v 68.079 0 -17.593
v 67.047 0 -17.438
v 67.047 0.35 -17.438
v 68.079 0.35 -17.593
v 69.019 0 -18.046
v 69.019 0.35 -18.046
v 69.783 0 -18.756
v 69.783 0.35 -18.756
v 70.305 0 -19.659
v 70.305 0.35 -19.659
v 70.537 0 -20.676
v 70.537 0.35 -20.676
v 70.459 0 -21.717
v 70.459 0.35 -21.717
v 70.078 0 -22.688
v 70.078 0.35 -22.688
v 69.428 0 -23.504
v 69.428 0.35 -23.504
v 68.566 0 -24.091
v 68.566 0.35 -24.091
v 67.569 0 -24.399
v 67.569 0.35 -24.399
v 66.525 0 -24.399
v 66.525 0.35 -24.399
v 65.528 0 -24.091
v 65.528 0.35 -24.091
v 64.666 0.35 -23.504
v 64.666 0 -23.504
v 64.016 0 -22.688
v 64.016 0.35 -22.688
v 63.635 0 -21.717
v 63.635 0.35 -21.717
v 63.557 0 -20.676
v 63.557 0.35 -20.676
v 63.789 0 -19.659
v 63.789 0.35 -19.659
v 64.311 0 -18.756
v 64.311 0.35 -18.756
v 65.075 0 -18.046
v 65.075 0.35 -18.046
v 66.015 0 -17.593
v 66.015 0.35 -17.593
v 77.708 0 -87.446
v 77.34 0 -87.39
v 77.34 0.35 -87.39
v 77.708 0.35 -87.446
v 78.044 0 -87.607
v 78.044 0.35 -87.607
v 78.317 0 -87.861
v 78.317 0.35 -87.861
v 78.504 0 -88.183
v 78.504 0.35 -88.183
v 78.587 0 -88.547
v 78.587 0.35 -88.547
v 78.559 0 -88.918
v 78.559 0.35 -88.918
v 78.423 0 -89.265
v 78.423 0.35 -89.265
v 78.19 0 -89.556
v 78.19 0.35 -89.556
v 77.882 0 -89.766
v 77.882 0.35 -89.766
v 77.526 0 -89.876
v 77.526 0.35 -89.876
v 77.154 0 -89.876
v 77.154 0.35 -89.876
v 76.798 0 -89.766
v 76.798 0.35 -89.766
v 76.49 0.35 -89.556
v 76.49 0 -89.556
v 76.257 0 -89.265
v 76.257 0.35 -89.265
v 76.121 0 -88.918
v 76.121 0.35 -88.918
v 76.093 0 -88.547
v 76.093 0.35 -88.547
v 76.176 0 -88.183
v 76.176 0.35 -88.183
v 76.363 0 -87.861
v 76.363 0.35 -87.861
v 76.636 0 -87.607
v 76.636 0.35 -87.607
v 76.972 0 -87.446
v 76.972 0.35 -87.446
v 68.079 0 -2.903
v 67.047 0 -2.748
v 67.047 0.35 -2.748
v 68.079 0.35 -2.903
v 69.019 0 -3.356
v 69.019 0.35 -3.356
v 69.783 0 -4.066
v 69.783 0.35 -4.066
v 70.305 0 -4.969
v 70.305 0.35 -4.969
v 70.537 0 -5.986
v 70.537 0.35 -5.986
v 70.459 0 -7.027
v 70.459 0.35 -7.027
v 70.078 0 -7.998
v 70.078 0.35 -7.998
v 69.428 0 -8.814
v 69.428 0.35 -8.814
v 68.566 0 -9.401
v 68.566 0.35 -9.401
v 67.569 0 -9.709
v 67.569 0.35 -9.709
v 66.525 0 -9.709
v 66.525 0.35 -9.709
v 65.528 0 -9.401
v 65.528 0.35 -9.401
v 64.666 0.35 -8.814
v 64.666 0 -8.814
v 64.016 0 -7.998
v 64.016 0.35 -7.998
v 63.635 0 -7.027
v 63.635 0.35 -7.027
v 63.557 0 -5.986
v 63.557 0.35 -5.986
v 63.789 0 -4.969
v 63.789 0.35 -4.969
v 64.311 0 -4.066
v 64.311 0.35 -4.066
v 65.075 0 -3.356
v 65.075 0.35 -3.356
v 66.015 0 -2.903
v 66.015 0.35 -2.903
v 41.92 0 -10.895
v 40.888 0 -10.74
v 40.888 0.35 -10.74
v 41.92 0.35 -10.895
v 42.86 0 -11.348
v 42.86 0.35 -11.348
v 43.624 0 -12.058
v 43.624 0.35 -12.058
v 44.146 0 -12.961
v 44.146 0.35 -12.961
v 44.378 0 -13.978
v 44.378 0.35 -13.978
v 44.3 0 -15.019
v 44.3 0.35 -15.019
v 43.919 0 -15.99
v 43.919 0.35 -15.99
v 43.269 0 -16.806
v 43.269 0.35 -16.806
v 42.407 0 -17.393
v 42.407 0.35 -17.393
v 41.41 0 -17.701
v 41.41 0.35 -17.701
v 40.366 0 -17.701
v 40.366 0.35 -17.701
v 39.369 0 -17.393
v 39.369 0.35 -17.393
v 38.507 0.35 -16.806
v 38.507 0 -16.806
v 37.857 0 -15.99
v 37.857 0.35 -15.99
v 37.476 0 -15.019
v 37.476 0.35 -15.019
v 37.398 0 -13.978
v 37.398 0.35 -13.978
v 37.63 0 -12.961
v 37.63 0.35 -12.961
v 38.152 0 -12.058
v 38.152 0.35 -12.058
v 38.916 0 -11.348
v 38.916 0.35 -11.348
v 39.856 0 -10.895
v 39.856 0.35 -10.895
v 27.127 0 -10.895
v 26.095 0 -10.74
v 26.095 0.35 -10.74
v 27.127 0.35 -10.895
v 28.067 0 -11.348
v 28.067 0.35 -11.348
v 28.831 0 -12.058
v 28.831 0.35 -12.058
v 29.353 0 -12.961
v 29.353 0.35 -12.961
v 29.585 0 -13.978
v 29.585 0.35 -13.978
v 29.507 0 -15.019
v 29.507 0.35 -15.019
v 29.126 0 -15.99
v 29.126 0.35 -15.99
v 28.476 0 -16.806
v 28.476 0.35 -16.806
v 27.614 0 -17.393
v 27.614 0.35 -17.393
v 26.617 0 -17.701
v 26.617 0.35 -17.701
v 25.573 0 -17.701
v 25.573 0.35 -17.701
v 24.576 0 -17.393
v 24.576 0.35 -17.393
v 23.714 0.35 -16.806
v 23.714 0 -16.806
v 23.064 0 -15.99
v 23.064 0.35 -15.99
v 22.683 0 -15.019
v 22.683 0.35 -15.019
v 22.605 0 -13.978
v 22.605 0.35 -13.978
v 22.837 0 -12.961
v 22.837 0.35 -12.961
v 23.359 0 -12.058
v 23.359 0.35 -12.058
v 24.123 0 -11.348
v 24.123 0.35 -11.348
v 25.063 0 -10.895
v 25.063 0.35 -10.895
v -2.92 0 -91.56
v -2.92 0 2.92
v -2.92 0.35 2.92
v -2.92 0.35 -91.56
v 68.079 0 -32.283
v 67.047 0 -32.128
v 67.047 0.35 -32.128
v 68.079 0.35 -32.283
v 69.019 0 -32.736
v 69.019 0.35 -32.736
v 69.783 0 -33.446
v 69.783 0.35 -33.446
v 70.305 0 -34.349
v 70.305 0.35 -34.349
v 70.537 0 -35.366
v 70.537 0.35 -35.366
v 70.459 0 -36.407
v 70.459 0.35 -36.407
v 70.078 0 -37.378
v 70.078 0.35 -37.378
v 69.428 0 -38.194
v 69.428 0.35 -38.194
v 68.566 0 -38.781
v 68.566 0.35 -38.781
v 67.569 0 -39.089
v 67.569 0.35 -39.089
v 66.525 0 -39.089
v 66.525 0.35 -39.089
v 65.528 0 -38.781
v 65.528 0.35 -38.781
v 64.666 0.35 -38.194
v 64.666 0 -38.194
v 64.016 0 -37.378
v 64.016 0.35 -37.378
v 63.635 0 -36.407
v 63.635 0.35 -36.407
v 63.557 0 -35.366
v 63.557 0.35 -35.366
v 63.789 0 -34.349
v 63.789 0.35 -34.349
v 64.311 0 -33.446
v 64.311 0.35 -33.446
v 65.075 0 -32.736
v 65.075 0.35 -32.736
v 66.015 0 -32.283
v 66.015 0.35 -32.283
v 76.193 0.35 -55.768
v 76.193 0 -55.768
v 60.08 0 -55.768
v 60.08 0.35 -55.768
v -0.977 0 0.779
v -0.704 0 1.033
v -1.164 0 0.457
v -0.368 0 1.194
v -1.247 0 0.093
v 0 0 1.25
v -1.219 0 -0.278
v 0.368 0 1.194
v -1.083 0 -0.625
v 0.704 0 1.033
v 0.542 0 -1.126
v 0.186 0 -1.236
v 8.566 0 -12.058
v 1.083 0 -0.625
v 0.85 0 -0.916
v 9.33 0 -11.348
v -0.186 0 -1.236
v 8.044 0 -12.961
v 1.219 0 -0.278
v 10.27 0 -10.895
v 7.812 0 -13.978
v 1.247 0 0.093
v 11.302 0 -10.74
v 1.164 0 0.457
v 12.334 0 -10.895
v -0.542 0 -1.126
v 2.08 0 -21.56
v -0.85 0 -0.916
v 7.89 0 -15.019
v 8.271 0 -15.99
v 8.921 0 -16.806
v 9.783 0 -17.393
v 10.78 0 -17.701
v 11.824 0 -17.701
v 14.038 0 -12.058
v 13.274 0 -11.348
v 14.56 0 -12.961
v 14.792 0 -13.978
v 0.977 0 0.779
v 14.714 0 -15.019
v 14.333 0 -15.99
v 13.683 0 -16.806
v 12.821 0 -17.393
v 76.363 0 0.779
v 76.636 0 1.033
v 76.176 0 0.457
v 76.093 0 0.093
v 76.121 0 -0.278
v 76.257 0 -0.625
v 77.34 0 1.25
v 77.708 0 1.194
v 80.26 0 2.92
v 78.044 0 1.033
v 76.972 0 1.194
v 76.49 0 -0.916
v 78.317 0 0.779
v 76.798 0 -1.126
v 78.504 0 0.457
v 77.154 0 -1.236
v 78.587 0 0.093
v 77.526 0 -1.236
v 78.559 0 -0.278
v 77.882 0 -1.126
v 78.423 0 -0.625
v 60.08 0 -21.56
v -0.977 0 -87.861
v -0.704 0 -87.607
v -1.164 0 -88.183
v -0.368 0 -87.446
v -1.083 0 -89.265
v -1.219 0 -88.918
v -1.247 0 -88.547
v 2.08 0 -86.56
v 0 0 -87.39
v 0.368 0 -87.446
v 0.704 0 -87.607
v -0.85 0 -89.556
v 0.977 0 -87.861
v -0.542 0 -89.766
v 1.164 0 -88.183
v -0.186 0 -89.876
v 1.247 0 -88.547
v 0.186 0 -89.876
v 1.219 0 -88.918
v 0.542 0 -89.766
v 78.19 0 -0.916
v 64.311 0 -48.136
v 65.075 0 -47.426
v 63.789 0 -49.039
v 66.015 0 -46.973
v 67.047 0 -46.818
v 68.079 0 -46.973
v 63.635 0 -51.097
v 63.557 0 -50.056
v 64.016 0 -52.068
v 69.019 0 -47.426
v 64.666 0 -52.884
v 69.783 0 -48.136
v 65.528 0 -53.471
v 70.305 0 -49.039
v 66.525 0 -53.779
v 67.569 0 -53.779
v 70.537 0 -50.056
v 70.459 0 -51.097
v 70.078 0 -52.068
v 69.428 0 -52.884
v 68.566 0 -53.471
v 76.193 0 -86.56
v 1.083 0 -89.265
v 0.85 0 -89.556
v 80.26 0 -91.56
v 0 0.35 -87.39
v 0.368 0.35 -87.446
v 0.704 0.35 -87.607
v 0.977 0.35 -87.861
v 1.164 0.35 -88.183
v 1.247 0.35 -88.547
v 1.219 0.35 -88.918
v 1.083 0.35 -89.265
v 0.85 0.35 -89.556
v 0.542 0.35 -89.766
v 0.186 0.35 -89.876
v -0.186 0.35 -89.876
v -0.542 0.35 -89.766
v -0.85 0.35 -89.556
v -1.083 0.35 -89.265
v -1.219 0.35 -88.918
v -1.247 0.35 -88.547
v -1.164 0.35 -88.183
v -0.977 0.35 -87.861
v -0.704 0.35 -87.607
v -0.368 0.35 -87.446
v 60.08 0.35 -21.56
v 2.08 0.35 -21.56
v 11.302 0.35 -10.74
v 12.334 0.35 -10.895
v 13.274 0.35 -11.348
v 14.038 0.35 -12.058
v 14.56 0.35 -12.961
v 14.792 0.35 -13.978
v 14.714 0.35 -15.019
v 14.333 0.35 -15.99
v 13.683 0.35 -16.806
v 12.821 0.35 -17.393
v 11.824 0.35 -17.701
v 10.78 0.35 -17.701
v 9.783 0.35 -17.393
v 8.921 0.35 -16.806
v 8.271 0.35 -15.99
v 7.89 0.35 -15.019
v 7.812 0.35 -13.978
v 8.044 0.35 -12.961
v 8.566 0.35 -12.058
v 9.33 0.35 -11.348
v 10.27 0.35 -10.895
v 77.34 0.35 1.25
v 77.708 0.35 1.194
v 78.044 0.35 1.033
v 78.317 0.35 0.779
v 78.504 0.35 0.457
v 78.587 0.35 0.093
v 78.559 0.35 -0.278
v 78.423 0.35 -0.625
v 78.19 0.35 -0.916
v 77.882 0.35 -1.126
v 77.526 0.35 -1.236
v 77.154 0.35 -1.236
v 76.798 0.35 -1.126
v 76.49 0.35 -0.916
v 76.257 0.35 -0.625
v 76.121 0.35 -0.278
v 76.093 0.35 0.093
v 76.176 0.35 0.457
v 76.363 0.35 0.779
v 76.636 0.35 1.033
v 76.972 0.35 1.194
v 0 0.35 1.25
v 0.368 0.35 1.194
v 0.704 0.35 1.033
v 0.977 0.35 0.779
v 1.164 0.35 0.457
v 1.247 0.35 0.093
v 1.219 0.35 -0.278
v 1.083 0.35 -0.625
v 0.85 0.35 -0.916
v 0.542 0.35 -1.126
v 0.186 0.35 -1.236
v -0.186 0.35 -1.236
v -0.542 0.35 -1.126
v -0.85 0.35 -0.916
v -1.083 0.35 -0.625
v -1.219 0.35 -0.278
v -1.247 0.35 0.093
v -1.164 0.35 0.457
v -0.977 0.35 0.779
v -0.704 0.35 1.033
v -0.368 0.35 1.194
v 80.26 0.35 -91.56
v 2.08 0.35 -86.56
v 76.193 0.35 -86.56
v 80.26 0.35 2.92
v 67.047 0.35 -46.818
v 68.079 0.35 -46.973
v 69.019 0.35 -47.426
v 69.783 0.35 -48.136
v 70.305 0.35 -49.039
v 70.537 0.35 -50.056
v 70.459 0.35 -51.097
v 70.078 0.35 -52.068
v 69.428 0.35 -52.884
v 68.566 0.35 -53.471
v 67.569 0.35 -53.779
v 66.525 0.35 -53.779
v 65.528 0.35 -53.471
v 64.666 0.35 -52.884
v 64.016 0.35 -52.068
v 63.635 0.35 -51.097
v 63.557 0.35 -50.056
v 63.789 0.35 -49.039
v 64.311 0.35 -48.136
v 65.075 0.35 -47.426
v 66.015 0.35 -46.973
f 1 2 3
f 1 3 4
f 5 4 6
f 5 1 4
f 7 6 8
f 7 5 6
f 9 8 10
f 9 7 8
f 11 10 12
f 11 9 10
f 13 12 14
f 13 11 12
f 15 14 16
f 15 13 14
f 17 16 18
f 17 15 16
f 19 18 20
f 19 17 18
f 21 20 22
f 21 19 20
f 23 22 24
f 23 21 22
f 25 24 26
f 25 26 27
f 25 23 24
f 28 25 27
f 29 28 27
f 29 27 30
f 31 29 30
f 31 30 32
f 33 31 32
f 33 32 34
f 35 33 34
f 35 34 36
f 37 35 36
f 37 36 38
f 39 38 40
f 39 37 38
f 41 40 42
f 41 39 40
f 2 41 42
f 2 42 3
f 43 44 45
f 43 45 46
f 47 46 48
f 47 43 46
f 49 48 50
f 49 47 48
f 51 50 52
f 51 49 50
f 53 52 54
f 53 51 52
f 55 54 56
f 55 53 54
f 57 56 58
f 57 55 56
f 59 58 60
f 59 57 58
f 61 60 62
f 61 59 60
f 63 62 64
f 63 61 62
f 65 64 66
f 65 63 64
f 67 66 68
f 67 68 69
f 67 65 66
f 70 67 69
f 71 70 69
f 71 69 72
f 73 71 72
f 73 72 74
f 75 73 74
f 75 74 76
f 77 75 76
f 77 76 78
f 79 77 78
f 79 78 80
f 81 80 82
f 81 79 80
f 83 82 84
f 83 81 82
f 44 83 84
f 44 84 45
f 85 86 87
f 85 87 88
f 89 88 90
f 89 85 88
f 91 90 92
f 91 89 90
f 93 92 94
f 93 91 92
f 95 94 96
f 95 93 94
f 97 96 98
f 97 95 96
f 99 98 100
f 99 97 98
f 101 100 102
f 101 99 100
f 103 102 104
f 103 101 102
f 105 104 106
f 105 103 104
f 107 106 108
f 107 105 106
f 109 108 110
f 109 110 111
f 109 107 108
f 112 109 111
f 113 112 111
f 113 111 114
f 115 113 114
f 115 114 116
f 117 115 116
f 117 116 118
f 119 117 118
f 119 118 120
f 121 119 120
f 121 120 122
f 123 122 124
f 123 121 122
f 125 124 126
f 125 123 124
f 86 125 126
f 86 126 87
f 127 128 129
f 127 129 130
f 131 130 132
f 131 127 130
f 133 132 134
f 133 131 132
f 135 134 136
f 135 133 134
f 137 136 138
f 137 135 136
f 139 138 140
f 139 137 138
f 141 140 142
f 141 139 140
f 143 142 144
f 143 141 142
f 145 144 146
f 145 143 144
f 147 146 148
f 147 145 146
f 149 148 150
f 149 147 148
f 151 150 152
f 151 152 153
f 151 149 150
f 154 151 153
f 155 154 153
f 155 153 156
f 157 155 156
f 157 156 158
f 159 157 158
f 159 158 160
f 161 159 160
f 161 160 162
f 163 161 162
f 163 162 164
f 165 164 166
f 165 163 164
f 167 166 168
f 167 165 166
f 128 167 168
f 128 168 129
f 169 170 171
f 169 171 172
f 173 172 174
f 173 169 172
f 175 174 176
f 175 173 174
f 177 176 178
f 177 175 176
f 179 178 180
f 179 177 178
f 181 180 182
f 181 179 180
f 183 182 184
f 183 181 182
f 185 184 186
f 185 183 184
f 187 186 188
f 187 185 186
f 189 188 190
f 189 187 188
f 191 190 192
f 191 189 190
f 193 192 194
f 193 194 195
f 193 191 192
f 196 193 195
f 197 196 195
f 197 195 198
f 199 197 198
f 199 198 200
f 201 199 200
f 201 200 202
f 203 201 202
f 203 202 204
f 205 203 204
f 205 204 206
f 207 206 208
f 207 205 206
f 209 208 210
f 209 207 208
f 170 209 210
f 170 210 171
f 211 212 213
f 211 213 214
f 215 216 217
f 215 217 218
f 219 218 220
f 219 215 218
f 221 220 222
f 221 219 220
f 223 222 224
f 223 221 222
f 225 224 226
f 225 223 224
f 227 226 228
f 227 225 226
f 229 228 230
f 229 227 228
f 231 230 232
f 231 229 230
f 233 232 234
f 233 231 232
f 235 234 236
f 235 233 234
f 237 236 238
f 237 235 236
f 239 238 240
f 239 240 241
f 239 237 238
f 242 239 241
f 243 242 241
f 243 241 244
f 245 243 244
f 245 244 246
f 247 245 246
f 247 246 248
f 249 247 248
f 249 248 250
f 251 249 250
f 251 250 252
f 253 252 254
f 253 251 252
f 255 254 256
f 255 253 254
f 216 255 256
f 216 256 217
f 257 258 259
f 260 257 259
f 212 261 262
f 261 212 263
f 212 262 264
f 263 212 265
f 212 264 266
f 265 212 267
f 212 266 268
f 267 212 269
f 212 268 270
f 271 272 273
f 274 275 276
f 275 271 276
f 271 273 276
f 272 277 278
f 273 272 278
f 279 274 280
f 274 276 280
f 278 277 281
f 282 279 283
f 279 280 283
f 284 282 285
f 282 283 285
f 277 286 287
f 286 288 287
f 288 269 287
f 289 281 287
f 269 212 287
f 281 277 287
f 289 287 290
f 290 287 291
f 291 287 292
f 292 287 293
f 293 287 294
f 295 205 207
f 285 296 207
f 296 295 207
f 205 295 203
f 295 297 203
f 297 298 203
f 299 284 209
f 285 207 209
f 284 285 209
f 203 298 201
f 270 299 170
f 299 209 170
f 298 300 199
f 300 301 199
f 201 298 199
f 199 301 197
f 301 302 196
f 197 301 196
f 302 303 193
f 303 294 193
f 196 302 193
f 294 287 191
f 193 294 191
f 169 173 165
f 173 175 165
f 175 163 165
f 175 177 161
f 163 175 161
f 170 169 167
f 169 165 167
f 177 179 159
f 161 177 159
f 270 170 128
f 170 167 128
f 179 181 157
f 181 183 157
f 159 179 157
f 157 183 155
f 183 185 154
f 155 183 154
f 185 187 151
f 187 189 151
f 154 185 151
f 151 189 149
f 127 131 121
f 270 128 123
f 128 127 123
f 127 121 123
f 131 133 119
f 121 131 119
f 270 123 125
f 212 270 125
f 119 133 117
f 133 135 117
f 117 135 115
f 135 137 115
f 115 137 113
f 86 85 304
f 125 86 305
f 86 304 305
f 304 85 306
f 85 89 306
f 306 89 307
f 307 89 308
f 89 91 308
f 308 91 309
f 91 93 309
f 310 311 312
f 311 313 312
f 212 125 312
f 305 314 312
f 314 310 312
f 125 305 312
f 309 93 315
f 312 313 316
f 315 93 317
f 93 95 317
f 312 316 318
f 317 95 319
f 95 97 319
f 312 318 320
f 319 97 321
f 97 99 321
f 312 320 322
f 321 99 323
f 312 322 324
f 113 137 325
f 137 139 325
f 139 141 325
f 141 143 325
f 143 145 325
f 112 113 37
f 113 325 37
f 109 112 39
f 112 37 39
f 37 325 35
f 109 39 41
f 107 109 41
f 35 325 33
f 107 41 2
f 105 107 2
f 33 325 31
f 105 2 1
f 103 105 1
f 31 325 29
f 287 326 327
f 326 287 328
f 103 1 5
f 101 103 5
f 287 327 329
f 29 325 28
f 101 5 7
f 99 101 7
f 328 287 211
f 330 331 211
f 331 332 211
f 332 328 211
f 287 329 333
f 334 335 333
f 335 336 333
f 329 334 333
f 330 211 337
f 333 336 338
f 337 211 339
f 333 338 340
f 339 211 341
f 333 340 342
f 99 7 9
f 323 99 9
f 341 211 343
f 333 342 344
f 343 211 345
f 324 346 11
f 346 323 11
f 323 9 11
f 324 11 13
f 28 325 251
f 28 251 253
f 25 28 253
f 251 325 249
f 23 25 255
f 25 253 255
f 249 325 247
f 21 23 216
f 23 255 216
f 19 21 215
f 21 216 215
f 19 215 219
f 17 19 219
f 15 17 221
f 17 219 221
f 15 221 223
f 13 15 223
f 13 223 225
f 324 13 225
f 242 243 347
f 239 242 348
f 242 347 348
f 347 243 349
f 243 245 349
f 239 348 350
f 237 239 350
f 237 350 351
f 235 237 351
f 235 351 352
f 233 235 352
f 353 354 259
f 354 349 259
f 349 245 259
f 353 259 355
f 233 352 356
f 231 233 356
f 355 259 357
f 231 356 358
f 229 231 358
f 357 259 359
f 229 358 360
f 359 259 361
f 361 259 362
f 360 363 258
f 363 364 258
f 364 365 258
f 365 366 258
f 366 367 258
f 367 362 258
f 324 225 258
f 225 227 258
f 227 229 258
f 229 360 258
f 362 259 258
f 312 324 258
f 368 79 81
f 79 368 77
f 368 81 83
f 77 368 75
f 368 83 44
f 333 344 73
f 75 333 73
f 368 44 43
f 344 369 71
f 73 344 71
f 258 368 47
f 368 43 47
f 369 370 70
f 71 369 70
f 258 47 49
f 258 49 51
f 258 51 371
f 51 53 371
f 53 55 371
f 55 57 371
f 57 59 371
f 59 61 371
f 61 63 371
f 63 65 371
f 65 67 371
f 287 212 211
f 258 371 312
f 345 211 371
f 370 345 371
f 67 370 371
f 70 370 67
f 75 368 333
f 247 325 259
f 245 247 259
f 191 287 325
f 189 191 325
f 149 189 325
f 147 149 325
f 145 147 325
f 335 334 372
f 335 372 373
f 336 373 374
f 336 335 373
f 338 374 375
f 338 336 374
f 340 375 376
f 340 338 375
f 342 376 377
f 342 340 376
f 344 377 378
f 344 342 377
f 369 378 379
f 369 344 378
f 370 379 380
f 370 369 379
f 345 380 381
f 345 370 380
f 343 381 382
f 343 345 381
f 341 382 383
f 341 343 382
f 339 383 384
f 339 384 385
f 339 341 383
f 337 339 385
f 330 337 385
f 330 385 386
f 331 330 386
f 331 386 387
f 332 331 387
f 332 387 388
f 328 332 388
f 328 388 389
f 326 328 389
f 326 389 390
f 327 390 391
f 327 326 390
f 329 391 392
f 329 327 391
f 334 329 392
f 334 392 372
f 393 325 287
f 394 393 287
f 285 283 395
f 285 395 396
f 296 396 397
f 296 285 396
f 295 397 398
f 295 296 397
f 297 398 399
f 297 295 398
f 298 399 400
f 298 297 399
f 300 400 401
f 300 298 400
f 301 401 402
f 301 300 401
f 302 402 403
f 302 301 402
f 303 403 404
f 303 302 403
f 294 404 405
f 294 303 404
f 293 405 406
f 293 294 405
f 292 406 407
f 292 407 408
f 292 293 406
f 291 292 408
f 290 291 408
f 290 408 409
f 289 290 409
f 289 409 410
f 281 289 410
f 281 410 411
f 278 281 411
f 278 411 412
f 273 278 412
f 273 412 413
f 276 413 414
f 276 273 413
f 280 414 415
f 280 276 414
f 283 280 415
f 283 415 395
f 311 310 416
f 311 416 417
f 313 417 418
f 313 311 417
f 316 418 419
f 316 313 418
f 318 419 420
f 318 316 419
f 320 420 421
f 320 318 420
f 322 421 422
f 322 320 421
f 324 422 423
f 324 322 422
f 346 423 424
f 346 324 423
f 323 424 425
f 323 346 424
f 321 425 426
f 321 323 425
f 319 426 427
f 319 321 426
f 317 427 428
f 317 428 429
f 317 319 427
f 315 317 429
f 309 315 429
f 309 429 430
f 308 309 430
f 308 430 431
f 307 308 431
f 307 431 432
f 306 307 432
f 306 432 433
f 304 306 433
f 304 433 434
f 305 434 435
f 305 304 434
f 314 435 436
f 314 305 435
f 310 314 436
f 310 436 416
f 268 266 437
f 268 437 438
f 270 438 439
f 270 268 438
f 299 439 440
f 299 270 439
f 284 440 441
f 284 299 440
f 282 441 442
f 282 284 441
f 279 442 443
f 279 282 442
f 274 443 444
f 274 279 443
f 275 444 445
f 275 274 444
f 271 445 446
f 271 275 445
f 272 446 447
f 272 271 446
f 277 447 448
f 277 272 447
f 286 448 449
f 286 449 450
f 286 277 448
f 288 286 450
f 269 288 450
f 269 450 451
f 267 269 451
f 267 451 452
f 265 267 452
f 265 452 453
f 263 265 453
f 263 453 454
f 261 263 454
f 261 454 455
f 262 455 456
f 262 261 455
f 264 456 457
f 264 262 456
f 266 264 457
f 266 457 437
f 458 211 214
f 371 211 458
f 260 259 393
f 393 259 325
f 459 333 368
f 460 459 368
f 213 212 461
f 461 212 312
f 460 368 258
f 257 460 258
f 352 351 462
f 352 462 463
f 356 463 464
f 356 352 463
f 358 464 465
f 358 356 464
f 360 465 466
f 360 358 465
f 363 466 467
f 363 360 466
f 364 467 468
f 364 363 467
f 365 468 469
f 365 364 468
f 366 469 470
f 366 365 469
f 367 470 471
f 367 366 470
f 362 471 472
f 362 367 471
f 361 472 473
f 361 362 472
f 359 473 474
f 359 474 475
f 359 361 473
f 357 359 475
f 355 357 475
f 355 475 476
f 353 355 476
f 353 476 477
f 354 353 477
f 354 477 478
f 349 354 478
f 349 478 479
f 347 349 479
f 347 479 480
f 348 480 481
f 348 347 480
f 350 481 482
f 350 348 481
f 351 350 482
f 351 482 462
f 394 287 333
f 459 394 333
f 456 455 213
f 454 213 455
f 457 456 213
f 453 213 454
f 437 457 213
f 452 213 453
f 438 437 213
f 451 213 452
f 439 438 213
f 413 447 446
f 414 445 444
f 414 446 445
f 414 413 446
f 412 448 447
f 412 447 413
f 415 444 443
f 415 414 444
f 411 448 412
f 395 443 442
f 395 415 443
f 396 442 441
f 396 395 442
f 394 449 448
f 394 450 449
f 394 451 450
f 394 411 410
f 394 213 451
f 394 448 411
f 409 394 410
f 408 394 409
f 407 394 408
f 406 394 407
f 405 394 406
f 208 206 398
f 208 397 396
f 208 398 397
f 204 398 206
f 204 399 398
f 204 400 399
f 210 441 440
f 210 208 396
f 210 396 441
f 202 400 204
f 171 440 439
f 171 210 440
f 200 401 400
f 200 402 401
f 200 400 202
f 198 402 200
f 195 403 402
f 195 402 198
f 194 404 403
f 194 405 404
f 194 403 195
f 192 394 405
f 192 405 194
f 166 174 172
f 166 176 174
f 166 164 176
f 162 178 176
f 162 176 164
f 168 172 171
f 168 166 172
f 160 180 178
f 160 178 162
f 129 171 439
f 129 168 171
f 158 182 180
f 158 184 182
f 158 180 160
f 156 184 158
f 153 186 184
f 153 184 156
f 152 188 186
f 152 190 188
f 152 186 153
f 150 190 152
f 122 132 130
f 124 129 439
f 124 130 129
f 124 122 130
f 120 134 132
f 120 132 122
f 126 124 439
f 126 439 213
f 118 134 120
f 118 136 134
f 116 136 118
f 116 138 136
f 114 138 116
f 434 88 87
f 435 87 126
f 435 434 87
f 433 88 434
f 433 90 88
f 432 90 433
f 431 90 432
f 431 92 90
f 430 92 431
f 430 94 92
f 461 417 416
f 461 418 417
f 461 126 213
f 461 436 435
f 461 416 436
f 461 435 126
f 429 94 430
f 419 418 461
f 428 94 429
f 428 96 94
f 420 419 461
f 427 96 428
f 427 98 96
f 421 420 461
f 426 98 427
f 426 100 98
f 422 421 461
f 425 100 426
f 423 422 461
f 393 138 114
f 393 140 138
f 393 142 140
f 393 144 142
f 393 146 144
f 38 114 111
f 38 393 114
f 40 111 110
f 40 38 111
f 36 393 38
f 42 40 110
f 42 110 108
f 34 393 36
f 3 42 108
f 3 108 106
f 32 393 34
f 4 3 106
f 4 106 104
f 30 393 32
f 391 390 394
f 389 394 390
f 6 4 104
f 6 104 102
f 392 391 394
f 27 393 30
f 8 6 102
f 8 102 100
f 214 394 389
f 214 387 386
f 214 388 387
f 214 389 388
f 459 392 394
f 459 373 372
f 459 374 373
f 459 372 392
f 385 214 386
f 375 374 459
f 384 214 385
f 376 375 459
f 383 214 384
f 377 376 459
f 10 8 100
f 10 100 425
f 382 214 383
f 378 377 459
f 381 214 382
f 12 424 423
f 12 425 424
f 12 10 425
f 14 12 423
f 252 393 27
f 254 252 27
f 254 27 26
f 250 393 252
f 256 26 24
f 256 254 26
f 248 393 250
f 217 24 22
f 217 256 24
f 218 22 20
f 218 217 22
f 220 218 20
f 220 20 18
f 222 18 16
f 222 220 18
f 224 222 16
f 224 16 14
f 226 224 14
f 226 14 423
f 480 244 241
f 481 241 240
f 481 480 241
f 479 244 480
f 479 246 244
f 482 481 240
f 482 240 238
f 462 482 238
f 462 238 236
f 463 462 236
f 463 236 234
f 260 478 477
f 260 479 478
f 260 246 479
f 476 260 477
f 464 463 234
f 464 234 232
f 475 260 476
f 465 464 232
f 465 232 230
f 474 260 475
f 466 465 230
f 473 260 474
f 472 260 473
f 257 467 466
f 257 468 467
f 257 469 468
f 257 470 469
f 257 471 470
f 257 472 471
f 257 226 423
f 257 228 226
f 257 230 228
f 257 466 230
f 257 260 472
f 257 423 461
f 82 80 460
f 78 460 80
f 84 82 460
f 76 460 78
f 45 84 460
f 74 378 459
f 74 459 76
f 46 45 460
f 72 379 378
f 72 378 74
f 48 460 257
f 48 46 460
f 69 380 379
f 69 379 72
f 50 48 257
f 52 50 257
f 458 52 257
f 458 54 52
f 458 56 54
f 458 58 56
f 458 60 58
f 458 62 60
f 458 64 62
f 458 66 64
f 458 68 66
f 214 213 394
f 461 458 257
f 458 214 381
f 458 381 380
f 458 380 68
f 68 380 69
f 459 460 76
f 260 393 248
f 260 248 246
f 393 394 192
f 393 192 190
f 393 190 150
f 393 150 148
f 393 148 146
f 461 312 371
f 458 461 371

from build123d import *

# Parameters (mm, degrees)
SKETCH1_W           = 83.18
SKETCH1_H           = 94.48
SKETCH1_R           = 1.25
SKETCH1_R_2         = 3.5
BOSS_EXTRUDE1_DEPTH = 0.35


with BuildPart() as part:
    # Sketch1 → Boss-Extrude1 (new body)
    with BuildSketch(Plane(origin=(0, 0, 0), x_dir=(1, 0, 0), z_dir=(0, 1, 0))):
        with Locations((38.67, 44.32)):
            Rectangle(SKETCH1_W, SKETCH1_H)
        with Locations(Location((0, 88.64, 0), (0, 0, 270))):
            Circle(SKETCH1_R, mode=Mode.SUBTRACT)
        with Locations(Location((77.34, 88.64, 0), (0, 0, 270))):
            Circle(SKETCH1_R, mode=Mode.SUBTRACT)
        with Locations(Location((77.34, 0, 0), (0, 0, 270))):
            Circle(SKETCH1_R, mode=Mode.SUBTRACT)
        with Locations(Location((0, 0, 0), (0, 0, 270))):
            Circle(SKETCH1_R, mode=Mode.SUBTRACT)
        with Locations(Location((11.302, 14.24, 0), (0, 0, 270))):
            Circle(SKETCH1_R_2, mode=Mode.SUBTRACT)
        with Locations(Location((26.095, 14.24, 0), (0, 0, 270))):
            Circle(SKETCH1_R_2, mode=Mode.SUBTRACT)
        with Locations(Location((40.888, 14.24, 0), (0, 0, 270))):
            Circle(SKETCH1_R_2, mode=Mode.SUBTRACT)
        with Locations(Location((67.047, 6.248, 0), (0, 0, 270))):
            Circle(SKETCH1_R_2, mode=Mode.SUBTRACT)
        with Locations(Location((67.047, 20.938, 0), (0, 0, 270))):
            Circle(SKETCH1_R_2, mode=Mode.SUBTRACT)
        with Locations(Location((67.047, 35.628, 0), (0, 0, 270))):
            Circle(SKETCH1_R_2, mode=Mode.SUBTRACT)
        with Locations(Location((67.047, 50.318, 0), (0, 0, 270))):
            Circle(SKETCH1_R_2, mode=Mode.SUBTRACT)
        Polygon((2.08, 86.56), (60.08, 86.56), (76.192857175, 86.56), (76.192857175, 55.768), (60.08, 55.768), (60.08, 21.56), (2.08, 21.56), align=None, mode=Mode.SUBTRACT)
    extrude(amount=BOSS_EXTRUDE1_DEPTH)


solid = part.part
